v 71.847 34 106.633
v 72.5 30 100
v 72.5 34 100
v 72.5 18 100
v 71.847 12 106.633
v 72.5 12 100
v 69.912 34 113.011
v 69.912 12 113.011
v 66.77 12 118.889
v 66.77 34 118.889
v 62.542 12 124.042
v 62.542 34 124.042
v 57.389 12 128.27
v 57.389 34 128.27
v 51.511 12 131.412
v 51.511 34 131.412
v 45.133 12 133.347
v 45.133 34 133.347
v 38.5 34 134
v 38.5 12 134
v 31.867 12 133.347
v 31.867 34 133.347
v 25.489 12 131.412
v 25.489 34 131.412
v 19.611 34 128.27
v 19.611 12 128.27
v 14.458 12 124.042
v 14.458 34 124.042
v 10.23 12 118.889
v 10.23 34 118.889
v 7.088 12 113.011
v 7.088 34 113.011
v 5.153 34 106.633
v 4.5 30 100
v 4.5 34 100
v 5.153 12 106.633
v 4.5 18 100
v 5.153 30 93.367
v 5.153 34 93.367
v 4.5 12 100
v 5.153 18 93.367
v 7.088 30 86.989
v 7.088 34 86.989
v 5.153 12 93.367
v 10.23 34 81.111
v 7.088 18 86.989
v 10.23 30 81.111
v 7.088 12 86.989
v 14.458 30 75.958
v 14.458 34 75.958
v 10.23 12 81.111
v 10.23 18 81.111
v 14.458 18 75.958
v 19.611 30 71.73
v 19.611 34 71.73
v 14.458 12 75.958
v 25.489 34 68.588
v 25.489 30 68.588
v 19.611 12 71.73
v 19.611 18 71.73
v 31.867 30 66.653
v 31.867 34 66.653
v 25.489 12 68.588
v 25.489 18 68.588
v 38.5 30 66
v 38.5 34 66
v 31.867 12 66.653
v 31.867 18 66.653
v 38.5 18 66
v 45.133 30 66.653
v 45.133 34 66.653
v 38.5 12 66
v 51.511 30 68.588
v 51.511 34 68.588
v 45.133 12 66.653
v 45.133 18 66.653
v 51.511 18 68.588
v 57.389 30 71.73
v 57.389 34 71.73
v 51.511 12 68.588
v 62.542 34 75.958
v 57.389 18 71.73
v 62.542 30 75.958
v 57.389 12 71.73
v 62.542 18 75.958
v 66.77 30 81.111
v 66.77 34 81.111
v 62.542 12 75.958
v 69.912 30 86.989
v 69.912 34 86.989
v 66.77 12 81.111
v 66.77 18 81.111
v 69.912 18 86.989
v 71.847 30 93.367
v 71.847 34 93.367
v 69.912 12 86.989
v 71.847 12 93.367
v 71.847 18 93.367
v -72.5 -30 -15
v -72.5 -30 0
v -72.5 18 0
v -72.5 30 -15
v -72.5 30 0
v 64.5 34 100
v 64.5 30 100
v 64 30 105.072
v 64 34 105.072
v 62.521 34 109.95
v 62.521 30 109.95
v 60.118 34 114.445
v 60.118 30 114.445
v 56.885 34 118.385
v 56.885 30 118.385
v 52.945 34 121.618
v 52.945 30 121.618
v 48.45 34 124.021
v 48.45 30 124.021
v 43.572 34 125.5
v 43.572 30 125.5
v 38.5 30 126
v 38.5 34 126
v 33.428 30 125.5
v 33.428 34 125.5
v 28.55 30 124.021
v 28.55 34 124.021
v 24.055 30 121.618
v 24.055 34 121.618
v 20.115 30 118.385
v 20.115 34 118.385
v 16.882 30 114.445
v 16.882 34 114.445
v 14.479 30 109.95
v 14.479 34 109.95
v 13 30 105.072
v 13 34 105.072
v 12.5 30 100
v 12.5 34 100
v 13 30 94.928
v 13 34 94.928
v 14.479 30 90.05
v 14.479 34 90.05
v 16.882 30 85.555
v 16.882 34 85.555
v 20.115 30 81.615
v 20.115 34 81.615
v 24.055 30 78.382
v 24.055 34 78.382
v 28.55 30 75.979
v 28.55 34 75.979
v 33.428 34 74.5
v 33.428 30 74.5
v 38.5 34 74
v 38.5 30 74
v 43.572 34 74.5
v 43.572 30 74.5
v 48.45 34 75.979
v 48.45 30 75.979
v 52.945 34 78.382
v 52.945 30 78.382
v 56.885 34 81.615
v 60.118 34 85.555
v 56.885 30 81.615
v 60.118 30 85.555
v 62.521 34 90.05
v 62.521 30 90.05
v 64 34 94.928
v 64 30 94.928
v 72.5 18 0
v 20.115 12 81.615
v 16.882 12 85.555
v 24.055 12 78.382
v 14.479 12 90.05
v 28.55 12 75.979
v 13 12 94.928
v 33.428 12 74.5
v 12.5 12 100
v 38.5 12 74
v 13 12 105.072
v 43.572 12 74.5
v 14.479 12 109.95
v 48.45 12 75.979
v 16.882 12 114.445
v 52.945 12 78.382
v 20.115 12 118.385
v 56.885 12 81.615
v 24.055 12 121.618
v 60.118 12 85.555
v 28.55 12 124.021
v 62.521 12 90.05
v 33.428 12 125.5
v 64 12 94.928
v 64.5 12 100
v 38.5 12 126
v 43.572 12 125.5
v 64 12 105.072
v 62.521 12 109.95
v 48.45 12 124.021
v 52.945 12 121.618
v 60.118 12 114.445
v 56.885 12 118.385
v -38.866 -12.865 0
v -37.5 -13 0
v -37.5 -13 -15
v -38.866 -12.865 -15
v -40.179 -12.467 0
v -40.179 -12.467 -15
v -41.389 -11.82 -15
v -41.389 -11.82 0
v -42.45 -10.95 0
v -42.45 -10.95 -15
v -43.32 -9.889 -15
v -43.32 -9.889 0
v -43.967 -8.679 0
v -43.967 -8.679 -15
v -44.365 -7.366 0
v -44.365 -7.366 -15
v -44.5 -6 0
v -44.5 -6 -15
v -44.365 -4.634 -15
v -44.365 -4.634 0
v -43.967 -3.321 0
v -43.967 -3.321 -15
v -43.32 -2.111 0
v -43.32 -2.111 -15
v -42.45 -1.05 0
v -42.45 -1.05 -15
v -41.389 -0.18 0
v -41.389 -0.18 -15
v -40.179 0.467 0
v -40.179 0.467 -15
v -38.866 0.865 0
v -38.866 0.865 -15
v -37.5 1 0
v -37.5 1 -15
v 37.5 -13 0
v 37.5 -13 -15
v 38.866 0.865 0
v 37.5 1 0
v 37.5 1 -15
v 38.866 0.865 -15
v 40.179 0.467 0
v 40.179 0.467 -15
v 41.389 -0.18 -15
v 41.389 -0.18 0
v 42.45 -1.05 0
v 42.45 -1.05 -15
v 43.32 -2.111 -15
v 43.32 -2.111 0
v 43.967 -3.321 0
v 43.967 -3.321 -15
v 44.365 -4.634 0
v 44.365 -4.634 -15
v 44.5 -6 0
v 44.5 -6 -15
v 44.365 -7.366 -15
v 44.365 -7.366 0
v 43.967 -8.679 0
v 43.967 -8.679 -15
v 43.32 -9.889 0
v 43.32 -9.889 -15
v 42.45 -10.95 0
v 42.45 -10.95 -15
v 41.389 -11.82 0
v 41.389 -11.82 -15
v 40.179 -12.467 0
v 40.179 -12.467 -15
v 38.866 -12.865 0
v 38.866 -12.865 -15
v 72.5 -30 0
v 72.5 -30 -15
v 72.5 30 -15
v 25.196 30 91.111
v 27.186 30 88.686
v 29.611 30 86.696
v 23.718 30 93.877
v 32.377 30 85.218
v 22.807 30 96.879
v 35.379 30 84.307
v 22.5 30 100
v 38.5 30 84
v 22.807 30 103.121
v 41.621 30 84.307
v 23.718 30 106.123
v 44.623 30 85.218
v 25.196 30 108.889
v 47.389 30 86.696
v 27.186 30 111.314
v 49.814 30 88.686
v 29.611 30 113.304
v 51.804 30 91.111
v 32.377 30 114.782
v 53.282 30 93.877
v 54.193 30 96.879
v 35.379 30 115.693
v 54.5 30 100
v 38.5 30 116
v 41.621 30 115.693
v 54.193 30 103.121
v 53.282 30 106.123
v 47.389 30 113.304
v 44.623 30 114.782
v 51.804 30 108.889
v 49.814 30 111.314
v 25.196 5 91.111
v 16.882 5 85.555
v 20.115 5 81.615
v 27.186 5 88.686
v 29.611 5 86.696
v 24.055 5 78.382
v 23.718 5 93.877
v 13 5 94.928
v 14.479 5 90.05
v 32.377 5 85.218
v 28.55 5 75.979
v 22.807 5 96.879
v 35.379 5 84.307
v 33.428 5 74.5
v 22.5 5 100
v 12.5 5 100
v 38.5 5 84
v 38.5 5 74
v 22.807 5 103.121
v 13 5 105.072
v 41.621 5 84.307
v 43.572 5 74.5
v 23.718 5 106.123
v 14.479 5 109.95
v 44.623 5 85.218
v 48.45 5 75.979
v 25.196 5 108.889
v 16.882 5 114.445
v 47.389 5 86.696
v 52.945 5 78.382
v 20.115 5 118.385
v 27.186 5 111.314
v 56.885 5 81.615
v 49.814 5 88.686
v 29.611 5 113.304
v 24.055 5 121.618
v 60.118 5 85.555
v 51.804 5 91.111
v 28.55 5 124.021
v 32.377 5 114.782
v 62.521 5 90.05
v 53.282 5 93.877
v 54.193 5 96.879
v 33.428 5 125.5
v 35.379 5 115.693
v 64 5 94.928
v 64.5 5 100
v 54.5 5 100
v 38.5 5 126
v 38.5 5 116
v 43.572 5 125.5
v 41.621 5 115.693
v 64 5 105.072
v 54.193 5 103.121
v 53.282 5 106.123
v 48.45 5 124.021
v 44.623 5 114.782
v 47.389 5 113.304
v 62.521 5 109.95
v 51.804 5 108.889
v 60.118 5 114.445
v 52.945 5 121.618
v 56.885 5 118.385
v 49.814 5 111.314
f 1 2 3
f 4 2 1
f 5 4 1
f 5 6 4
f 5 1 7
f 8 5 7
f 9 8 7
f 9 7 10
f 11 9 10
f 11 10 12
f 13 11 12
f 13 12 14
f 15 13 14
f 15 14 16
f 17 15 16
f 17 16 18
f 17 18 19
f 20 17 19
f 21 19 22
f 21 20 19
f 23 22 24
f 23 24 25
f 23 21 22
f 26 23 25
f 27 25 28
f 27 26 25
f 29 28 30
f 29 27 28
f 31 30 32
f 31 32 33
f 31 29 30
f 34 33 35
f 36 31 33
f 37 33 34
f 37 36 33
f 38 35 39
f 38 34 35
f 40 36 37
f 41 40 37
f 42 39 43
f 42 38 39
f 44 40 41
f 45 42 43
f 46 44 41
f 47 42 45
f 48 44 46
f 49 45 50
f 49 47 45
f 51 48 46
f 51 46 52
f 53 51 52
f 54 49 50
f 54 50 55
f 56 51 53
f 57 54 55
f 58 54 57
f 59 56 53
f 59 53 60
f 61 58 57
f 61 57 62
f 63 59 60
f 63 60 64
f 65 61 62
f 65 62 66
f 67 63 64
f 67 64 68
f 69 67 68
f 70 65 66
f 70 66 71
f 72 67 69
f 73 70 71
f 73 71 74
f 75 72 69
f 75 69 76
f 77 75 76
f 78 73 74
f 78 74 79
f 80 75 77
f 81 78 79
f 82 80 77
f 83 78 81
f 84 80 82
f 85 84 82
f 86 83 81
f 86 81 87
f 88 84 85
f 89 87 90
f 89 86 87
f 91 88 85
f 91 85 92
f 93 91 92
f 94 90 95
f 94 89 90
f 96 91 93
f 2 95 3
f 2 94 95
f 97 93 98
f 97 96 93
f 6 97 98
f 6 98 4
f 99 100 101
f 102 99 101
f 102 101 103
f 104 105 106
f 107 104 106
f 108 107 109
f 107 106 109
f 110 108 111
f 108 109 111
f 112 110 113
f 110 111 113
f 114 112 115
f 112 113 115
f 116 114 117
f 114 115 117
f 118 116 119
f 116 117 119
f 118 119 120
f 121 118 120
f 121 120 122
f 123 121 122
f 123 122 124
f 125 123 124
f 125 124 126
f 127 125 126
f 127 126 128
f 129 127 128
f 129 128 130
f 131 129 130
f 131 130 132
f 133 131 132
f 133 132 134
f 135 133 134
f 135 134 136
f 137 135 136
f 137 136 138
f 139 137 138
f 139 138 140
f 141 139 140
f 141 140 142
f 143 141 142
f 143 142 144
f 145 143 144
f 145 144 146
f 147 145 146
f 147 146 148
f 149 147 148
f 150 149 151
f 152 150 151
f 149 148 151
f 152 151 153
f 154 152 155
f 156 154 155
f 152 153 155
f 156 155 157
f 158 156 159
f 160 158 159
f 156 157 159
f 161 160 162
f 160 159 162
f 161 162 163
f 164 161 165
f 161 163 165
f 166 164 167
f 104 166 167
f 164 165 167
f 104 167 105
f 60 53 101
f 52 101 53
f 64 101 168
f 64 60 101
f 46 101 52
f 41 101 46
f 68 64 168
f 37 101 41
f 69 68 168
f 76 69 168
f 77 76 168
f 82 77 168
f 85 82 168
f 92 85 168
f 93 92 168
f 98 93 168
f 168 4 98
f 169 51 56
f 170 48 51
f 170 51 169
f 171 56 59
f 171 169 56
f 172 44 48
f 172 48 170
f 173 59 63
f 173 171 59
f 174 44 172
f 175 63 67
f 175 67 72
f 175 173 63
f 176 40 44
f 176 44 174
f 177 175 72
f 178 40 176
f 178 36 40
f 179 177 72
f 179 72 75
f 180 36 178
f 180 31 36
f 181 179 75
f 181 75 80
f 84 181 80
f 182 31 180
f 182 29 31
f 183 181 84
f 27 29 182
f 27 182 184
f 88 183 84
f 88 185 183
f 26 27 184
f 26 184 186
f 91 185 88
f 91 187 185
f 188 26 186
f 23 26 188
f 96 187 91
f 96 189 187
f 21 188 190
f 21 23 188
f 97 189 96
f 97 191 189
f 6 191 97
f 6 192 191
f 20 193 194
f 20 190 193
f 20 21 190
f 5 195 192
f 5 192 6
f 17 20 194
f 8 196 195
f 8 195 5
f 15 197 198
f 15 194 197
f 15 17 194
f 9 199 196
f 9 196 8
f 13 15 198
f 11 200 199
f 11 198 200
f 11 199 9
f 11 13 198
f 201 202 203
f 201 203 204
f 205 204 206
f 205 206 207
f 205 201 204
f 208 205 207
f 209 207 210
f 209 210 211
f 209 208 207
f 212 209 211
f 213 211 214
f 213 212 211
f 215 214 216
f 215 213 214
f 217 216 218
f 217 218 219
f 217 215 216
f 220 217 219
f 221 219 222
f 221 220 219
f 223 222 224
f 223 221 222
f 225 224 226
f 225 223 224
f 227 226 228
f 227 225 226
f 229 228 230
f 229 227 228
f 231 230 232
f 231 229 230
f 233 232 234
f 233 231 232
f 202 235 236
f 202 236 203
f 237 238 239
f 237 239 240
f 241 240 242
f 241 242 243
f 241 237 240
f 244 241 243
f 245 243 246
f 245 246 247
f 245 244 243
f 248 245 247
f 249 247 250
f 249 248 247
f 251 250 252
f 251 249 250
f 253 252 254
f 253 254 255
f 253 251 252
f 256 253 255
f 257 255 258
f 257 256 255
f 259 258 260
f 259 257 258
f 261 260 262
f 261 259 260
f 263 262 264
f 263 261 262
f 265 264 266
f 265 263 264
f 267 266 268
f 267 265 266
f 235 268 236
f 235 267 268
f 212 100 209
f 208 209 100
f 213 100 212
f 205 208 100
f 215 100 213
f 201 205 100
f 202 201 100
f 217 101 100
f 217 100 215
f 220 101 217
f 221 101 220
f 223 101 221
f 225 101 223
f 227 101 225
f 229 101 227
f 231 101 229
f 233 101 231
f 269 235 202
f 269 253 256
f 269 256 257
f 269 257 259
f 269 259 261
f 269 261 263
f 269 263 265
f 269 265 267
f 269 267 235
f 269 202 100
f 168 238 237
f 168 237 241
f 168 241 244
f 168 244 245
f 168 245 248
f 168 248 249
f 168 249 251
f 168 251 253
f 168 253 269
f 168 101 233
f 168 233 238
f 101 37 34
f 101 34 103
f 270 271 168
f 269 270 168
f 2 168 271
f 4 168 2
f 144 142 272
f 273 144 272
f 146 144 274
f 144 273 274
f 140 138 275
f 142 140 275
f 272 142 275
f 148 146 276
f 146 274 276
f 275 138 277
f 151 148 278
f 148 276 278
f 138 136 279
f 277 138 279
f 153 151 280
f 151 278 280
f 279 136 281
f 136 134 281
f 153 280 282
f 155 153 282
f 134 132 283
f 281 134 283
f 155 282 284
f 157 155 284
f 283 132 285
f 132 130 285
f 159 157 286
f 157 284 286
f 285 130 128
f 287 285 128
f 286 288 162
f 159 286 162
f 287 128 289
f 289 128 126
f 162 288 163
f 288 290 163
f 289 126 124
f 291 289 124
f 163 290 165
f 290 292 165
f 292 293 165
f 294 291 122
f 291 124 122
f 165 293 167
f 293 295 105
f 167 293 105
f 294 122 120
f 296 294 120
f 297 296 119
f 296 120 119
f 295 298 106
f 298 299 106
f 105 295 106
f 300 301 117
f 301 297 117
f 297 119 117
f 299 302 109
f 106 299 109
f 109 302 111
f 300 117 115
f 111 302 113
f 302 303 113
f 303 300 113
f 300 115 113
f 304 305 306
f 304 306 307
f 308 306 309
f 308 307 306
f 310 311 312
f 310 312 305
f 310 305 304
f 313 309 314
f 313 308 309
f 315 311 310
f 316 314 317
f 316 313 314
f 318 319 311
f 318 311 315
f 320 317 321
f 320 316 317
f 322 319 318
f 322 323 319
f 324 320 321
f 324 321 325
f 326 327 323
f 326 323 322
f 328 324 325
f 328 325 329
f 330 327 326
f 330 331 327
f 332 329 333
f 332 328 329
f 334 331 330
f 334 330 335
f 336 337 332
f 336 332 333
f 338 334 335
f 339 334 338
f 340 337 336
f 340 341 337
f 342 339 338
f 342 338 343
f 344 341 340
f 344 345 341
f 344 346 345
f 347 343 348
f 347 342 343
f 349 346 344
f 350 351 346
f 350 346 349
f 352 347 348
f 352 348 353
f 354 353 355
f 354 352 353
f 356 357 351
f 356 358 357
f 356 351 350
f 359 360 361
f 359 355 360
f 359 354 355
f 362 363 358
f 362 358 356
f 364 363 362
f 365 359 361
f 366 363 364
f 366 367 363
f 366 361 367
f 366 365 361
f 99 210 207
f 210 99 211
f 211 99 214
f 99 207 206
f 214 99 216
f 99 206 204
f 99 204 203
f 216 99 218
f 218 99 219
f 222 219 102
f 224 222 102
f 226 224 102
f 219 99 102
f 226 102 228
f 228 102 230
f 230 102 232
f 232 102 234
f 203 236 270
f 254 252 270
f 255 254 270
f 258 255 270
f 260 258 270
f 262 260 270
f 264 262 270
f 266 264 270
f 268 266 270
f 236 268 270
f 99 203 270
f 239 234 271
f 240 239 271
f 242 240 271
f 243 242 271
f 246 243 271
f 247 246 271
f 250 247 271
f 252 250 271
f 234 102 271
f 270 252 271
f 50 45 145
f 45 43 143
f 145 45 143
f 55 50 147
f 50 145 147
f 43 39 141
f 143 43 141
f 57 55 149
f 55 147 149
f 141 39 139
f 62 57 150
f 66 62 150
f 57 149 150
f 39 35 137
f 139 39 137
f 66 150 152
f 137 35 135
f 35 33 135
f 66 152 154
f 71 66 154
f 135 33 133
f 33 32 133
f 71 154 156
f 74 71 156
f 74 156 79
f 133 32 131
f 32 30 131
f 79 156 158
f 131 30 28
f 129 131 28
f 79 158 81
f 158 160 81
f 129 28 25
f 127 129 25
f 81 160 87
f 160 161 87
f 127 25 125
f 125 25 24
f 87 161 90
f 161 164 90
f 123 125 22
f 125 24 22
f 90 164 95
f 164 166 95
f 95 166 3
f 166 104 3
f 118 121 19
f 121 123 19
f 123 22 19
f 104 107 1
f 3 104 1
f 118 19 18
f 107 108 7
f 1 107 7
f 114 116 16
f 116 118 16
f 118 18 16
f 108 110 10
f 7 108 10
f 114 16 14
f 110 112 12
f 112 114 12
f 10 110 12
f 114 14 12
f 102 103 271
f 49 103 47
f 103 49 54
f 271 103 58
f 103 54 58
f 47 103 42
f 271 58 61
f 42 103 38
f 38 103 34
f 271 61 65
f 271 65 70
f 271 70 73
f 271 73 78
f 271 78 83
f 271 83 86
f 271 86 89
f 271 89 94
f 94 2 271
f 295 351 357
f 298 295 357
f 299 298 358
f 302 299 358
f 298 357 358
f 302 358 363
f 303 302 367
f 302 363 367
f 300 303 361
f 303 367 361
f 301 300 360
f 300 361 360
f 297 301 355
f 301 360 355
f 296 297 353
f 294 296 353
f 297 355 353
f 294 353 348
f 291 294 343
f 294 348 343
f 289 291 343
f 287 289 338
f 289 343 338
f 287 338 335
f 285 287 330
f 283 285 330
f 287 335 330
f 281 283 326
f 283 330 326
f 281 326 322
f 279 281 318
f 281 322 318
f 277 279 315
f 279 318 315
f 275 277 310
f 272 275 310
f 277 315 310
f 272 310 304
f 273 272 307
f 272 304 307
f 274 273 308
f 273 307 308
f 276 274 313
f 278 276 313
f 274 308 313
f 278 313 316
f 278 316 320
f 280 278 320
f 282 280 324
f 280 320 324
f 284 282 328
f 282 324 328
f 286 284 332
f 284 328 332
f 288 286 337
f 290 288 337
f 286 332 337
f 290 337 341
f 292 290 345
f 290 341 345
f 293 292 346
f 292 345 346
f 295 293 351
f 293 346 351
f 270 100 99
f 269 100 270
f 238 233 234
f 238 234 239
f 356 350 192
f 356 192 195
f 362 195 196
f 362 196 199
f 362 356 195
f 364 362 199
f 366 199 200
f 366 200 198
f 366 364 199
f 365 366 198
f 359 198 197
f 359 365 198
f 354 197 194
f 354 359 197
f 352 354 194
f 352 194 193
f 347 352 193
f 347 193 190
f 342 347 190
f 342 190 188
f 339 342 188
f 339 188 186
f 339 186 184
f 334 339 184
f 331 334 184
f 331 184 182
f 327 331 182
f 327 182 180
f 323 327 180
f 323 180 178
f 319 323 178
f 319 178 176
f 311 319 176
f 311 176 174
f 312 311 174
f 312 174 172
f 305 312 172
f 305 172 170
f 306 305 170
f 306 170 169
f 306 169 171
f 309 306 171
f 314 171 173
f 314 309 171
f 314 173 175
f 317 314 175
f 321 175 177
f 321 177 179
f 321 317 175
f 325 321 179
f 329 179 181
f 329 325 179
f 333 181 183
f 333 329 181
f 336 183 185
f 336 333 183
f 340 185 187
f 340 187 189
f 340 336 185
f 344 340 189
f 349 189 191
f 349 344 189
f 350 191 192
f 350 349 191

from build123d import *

# Parameters (mm, degrees)
F0_W     = 145
F0_H     = 60
F1_DEPTH = 15
F3_START = -18
F3_DEPTH = 12
F4_START = -12
F2_R     = 26
F4_DEPTH = 22
F5_START = -5
F2_R_2   = 16
F5_DEPTH = 25


with BuildPart() as f1:
    # F0 (on Top) → F1 (new body)
    with BuildSketch(Plane.XY):
        Rectangle(F0_W, F0_H)
        with BuildLine():
            ThreePointArc((-37.5, -13), (-44.5, -6), (-37.5, 1))
            Line((-37.5, 1), (37.5, 1))
            ThreePointArc((37.5, 1), (44.5, -6), (37.5, -13))
            Line((37.5, -13), (-37.5, -13))
        make_face(mode=Mode.SUBTRACT)
    extrude(amount=-F1_DEPTH)

    # F2 (on Front) → F3 (join)
    with BuildSketch(Plane.XZ.offset(F3_START)):
        with BuildLine():
            Line((72.5, 0), (72.5, 100))
            ThreePointArc((72.5, 100), (38.5, 66), (4.5, 100))
            Line((4.5, 100), (-72.5, 0))
            Line((-72.5, 0), (-63.7343847897, 0))
            Line((-63.7343847897, 0), (65.0060102344, 0))
            Line((65.0060102344, 0), (72.5, 0))
        make_face()
    extrude(amount=-F3_DEPTH)

    # F2 (on Front) → F4 (join)
    with BuildSketch(Plane.XZ.offset(F4_START)):
        with BuildLine():
            ThreePointArc((4.5, 100), (38.5, 66), (72.5, 100))
            ThreePointArc((72.5, 100), (38.5, 134), (4.5, 100))
        make_face()
        with Locations((38.5, 100)):
            Circle(F2_R, mode=Mode.SUBTRACT)
    extrude(amount=-F4_DEPTH)

    # F2 (on Front) → F5 (join)
    with BuildSketch(Plane.XZ.offset(F5_START)):
        with Locations((38.5, 100)):
            Circle(F2_R)
        with Locations((38.5, 100)):
            Circle(F2_R_2, mode=Mode.SUBTRACT)
    extrude(amount=-F5_DEPTH)


solid = f1.part
